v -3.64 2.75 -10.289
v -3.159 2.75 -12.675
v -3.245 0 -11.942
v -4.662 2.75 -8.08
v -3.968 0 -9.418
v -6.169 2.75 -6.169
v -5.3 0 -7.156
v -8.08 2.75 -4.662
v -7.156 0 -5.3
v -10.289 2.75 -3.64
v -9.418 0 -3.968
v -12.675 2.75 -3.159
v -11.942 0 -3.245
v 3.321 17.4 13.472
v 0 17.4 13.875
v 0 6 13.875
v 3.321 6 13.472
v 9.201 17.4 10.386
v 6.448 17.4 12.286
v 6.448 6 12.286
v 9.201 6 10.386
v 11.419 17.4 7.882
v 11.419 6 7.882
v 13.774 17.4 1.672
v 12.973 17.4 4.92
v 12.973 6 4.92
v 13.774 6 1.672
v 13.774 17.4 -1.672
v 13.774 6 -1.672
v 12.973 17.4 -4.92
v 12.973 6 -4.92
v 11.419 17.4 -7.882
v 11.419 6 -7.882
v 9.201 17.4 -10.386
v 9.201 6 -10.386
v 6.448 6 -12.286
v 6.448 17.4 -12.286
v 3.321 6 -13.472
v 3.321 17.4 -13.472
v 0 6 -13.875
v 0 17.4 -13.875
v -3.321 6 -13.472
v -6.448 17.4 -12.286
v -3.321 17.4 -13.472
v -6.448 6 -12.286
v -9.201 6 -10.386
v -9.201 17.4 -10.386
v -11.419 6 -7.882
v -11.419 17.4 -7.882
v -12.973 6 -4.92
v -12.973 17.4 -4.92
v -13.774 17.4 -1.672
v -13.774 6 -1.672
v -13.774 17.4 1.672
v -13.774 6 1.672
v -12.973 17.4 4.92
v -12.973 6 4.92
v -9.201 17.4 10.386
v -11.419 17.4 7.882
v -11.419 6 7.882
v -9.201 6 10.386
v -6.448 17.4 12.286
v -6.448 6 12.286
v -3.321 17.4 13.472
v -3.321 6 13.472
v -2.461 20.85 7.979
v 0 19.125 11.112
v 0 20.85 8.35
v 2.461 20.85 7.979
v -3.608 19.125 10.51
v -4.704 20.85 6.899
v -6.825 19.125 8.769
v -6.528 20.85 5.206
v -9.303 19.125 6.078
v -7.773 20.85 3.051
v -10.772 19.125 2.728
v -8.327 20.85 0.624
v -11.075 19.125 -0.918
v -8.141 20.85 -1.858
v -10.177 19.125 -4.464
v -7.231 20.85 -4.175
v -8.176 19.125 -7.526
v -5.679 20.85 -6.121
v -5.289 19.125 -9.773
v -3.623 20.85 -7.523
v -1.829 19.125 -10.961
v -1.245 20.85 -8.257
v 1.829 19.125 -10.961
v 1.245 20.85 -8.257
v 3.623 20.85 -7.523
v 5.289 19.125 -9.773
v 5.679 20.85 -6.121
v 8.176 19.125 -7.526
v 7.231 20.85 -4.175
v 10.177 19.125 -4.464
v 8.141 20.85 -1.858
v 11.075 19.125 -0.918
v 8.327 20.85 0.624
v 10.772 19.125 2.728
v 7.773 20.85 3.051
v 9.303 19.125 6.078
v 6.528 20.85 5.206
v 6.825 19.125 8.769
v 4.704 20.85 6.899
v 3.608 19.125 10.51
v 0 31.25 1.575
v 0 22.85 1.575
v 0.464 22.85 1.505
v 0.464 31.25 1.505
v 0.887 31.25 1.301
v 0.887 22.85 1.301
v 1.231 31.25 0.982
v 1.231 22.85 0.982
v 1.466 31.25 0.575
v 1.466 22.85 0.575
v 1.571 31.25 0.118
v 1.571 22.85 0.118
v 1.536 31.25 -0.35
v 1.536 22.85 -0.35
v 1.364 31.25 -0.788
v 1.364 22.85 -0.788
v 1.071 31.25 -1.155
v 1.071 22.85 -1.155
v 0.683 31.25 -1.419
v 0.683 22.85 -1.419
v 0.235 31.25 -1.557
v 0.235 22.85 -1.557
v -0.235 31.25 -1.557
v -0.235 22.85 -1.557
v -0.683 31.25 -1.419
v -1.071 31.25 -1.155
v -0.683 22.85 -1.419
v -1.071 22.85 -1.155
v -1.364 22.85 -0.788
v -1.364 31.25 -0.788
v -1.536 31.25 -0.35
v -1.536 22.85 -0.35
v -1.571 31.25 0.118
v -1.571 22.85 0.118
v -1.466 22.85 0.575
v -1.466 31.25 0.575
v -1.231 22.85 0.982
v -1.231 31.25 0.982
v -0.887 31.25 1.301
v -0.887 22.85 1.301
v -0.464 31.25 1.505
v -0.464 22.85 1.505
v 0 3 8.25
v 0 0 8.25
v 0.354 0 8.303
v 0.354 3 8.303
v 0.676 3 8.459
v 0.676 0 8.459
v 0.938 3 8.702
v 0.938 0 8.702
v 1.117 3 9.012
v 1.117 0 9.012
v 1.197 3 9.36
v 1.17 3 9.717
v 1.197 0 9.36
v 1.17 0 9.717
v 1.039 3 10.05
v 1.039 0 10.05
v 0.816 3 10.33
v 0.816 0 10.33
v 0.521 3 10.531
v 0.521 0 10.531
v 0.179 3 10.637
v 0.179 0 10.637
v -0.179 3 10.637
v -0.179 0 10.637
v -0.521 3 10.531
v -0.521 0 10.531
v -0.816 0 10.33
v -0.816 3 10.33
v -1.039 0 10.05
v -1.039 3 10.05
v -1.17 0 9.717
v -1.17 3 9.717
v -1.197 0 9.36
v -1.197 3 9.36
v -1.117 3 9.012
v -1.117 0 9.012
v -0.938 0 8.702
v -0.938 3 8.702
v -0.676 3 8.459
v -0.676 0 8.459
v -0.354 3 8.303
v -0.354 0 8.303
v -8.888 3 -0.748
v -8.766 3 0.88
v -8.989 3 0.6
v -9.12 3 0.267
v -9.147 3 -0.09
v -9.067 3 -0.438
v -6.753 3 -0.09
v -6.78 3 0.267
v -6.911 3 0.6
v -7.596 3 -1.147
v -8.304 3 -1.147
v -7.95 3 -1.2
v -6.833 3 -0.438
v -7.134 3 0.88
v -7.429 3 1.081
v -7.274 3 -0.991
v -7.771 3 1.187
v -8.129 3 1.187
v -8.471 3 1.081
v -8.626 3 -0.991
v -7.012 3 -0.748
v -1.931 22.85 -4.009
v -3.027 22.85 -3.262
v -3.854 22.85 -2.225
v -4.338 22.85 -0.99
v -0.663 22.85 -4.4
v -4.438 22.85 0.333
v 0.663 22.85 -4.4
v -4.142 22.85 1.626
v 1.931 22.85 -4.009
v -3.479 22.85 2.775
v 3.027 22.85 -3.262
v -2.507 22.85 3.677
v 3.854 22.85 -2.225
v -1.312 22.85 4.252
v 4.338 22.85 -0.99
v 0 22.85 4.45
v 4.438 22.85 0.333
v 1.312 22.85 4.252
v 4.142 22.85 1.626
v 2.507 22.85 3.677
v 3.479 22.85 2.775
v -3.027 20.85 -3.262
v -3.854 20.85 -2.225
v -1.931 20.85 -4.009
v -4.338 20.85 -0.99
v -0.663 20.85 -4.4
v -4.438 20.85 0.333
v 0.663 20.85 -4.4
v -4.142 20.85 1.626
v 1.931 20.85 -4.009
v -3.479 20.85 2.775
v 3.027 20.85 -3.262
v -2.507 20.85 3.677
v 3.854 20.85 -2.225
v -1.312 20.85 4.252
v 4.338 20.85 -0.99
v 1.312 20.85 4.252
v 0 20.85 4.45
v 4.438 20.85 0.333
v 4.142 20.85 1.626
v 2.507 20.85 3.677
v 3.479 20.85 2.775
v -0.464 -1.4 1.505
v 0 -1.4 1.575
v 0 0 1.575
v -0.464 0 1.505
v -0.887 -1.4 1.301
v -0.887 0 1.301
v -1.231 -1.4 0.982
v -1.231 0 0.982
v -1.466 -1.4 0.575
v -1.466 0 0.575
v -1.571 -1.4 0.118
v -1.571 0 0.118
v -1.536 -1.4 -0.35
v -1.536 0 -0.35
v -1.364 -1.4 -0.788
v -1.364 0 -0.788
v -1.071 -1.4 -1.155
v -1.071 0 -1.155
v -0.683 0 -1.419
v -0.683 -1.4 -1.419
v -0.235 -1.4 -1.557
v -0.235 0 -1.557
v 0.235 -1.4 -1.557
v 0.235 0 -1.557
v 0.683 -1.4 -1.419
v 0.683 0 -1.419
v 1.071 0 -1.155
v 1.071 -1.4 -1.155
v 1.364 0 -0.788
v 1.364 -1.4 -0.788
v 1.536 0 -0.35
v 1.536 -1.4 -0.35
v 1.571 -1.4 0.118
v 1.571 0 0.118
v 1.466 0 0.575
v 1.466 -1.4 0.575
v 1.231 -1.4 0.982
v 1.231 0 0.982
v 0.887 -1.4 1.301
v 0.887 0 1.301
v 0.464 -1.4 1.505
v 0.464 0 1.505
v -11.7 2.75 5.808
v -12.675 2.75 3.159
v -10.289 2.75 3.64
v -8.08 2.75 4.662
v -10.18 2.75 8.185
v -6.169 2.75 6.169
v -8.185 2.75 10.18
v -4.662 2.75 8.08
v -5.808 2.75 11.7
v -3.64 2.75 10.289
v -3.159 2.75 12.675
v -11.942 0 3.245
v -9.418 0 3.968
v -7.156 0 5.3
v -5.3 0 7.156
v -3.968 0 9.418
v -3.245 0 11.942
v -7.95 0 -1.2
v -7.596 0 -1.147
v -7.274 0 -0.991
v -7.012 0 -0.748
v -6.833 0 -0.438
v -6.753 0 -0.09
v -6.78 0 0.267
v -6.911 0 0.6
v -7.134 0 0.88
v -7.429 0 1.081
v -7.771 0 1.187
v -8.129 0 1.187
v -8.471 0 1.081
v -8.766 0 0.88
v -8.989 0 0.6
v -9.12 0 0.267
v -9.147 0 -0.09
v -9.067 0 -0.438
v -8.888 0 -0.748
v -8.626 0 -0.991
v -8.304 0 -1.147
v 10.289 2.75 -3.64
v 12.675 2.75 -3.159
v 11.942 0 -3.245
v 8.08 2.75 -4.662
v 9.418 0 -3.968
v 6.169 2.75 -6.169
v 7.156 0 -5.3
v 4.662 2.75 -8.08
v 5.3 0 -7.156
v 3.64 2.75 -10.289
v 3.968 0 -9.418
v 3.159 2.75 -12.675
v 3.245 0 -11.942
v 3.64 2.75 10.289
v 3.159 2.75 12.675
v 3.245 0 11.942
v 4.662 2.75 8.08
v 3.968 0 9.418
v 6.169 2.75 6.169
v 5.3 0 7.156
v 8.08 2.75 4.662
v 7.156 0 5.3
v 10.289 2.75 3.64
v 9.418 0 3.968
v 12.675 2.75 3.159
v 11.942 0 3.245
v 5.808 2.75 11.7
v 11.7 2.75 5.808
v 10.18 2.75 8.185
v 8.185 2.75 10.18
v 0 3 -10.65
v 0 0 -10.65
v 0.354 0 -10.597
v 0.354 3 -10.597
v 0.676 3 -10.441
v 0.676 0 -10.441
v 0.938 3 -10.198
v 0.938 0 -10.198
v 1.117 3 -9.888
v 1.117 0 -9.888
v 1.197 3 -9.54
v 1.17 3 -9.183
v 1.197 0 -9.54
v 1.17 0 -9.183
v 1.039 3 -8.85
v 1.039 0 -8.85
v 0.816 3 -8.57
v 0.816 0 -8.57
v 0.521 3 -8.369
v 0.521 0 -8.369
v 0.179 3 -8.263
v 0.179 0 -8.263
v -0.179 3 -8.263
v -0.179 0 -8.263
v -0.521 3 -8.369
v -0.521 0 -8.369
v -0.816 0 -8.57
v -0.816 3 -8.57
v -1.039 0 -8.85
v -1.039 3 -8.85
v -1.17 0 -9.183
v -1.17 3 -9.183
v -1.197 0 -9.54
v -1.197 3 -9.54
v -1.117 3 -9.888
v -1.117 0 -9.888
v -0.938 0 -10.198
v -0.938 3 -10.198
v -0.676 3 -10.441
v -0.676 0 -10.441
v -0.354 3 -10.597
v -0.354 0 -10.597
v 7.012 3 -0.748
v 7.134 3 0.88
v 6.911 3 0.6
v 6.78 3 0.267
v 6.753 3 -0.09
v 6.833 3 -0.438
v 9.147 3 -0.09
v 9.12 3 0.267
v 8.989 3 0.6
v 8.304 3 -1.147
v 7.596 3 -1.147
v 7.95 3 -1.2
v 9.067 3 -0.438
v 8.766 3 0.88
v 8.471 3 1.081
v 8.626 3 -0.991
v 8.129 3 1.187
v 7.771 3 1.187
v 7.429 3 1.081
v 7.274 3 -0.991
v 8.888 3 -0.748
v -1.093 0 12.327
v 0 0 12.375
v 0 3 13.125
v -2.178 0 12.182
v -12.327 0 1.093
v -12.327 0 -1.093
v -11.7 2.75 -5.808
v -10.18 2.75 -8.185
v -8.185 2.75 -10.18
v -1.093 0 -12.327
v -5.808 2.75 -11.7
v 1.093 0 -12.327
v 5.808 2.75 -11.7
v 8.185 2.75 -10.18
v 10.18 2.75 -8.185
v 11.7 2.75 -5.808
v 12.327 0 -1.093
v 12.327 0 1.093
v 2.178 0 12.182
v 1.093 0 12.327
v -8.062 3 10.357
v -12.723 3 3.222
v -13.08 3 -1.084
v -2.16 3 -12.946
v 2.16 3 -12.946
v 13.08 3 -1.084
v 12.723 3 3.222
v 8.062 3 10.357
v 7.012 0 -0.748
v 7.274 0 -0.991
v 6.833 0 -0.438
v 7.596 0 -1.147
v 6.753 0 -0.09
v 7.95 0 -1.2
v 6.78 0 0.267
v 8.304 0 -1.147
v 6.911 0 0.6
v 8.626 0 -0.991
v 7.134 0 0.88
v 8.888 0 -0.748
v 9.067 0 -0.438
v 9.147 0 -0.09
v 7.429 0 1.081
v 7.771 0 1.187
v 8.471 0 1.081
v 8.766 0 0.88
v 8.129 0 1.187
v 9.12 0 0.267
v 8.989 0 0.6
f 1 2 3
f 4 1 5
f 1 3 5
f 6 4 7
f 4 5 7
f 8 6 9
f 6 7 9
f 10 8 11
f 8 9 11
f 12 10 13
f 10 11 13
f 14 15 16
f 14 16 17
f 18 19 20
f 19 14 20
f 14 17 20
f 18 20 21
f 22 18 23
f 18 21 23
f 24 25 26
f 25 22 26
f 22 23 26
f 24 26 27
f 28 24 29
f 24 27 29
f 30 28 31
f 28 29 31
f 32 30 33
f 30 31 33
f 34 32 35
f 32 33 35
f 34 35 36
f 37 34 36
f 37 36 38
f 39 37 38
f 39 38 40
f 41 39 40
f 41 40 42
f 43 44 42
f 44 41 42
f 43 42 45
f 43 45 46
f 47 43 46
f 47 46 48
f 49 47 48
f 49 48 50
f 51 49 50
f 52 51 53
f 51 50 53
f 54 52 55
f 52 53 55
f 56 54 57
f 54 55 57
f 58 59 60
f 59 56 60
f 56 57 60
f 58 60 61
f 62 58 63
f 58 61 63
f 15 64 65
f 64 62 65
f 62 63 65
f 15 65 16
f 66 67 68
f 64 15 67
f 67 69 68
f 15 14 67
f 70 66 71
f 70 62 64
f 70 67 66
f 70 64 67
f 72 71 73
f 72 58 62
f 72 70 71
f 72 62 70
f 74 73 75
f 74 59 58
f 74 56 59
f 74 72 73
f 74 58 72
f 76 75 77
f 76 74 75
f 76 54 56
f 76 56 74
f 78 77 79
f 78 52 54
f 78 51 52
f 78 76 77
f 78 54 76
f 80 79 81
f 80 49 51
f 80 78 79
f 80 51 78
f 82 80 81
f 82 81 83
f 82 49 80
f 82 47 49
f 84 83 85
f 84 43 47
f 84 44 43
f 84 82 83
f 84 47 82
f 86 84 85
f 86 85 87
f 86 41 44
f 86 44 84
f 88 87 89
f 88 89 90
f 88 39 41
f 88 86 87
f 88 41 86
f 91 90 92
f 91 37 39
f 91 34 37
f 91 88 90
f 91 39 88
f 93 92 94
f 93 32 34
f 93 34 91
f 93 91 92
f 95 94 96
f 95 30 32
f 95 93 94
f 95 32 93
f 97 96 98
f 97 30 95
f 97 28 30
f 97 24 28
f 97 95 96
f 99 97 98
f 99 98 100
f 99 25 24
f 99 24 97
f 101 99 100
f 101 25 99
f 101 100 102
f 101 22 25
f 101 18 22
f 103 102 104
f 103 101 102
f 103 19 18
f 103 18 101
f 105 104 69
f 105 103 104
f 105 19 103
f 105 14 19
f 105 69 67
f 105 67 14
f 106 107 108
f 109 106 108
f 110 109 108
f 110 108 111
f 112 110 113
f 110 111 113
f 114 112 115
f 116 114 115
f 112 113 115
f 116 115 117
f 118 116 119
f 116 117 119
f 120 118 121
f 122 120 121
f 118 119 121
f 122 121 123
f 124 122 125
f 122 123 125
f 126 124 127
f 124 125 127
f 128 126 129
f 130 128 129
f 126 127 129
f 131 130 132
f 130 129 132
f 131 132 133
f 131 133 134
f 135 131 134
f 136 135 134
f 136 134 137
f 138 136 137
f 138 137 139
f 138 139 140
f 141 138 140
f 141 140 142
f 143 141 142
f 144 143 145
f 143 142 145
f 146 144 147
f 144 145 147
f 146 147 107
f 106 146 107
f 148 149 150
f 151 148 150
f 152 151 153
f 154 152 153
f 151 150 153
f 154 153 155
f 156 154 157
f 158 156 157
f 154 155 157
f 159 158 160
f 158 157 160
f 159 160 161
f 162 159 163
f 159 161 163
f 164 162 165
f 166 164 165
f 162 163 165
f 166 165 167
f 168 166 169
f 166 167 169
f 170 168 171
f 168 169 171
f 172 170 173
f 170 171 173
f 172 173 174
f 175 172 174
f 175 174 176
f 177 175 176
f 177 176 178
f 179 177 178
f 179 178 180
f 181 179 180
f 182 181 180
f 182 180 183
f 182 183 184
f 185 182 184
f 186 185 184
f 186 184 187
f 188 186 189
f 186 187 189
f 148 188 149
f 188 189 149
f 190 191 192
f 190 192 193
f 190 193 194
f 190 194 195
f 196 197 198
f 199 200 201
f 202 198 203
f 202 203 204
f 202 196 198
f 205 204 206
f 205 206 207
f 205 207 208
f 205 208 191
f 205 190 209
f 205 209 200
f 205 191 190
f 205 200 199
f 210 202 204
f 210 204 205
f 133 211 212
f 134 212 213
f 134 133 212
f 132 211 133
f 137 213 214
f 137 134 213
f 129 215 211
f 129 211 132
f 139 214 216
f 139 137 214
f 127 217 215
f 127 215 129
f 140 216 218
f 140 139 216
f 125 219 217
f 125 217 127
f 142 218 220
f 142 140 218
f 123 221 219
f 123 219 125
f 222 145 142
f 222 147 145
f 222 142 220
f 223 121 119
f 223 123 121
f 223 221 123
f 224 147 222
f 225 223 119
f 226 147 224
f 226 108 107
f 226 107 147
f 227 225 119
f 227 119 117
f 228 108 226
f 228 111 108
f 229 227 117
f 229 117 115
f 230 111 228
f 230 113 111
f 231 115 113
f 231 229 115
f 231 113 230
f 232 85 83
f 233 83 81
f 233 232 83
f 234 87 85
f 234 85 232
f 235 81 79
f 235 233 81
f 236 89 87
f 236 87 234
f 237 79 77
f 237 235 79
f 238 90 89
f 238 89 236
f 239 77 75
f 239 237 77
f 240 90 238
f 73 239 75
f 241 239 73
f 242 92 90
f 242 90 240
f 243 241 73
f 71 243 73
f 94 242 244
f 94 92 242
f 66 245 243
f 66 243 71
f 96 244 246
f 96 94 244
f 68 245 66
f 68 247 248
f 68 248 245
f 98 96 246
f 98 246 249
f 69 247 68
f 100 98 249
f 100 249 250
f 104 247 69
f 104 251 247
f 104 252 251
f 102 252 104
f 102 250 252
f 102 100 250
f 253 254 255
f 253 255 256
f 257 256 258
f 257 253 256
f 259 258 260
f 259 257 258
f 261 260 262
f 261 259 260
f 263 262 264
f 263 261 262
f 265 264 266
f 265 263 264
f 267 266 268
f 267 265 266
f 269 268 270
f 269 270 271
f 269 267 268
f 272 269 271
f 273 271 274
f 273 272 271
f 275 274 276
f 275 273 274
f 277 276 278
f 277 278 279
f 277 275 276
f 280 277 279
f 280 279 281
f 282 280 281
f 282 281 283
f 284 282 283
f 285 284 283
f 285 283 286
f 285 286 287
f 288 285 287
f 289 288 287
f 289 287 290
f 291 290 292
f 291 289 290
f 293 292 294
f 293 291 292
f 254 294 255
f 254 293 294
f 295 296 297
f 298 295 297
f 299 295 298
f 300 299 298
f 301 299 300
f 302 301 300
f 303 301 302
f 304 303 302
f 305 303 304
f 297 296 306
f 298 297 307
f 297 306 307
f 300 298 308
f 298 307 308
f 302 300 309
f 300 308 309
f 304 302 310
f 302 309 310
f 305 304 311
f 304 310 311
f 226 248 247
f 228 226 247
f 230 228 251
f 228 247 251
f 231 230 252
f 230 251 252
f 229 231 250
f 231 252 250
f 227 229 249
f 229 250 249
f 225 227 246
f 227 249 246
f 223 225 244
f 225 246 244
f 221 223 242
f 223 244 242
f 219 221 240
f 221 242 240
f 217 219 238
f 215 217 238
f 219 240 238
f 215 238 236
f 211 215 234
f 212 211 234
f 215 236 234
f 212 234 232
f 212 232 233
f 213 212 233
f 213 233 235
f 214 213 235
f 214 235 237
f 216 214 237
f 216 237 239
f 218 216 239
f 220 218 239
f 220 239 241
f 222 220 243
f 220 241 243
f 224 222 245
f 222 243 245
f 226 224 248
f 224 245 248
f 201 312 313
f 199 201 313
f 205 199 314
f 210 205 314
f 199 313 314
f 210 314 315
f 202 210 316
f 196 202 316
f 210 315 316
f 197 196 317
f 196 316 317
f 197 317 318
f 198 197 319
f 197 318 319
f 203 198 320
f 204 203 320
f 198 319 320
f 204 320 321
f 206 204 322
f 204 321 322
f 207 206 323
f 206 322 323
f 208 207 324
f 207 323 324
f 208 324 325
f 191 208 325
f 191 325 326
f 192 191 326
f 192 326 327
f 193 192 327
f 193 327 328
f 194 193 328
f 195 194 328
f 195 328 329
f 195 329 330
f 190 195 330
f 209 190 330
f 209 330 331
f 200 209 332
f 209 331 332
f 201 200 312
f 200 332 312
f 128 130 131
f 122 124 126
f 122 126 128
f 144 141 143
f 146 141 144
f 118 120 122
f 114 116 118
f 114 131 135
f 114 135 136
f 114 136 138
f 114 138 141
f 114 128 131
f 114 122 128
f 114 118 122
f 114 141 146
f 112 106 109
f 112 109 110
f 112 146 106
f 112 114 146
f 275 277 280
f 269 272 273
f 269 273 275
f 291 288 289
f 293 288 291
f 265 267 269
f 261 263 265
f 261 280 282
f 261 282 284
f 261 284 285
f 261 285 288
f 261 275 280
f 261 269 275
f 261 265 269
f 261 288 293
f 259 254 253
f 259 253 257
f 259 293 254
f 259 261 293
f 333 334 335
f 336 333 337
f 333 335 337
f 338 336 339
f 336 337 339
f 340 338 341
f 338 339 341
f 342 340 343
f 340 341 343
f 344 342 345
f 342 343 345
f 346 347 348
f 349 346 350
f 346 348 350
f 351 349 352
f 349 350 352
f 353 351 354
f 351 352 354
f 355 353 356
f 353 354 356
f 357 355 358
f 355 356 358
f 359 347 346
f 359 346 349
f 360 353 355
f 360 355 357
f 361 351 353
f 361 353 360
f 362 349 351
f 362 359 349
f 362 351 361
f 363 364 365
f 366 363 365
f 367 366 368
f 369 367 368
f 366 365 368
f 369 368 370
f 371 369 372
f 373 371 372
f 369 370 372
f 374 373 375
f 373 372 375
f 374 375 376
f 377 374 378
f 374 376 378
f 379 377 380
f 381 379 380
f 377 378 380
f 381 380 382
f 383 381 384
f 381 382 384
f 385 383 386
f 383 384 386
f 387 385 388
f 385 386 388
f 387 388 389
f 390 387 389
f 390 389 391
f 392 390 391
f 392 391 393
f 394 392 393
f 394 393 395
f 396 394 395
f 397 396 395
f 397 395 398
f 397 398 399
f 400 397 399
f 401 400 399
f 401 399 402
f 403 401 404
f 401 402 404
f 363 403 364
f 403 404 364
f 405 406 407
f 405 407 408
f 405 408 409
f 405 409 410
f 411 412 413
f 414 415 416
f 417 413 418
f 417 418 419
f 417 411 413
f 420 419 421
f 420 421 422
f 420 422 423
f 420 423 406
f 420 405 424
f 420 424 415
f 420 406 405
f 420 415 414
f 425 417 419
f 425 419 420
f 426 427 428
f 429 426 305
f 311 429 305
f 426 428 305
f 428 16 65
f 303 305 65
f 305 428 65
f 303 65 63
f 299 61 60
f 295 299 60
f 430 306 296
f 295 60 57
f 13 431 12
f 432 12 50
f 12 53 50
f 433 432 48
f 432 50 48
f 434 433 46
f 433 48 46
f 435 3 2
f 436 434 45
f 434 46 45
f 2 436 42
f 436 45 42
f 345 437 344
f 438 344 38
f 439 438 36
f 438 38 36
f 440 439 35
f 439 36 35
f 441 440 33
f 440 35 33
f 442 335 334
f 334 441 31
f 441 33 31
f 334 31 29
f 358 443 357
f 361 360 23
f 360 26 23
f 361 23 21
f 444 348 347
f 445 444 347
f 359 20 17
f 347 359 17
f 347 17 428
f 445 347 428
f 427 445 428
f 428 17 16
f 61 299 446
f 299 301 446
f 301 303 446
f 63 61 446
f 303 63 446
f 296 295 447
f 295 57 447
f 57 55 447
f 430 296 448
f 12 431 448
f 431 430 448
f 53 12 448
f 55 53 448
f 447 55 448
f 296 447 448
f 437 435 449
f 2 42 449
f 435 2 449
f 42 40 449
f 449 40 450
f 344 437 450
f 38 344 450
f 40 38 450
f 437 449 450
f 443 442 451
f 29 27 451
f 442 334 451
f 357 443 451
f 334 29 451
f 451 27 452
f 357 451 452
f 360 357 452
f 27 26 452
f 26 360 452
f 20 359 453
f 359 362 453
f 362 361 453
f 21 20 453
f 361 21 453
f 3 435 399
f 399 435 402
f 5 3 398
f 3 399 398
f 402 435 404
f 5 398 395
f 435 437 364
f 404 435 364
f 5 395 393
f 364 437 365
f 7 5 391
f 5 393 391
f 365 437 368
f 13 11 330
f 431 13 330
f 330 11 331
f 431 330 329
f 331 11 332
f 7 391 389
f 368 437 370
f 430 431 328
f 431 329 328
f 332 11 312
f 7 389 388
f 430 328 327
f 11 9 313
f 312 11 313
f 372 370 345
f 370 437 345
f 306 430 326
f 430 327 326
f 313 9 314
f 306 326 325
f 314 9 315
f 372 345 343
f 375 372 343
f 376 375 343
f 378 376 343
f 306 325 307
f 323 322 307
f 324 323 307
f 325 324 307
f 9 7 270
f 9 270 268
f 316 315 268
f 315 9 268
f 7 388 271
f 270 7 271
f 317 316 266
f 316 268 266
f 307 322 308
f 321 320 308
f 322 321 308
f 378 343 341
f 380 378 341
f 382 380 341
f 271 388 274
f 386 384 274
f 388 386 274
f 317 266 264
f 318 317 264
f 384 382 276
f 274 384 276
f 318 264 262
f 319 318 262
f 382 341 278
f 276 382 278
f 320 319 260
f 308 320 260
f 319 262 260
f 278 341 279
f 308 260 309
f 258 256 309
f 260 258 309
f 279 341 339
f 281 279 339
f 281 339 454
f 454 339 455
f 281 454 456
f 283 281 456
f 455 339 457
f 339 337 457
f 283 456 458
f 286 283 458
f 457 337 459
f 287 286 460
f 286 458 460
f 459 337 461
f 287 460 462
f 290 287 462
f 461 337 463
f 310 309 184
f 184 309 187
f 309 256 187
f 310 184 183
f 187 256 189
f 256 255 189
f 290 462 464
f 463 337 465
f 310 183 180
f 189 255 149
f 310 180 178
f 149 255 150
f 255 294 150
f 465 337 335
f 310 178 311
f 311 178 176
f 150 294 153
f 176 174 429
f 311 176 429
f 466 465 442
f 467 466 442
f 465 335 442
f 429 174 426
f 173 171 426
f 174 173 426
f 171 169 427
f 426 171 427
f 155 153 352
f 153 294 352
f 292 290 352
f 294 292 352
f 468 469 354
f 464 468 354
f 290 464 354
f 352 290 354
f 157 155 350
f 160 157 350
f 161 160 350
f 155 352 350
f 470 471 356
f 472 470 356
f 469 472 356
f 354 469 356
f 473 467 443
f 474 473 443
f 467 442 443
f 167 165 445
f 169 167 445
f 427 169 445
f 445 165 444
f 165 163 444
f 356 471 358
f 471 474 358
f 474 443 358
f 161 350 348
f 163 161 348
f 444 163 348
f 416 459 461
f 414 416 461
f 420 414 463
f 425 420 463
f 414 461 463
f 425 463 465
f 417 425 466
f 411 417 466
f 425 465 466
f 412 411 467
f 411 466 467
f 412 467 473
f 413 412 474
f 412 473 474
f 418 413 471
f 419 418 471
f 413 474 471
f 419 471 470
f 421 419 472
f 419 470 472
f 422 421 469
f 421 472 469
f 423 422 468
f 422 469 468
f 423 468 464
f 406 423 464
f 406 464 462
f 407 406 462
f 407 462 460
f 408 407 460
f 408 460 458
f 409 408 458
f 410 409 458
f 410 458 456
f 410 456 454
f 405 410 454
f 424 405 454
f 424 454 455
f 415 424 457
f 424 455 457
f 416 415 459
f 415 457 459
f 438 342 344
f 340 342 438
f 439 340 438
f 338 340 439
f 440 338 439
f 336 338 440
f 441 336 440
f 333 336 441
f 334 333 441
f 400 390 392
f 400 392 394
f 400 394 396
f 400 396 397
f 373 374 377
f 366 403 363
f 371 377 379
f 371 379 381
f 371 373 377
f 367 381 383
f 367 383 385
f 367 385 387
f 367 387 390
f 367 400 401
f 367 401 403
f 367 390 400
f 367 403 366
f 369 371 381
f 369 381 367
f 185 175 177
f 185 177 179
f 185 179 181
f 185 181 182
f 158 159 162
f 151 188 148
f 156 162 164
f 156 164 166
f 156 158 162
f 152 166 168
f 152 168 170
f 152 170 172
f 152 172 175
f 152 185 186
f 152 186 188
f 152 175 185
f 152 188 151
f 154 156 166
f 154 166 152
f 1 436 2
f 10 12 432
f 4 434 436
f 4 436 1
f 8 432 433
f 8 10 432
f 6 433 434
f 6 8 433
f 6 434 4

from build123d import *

# Parameters (mm, degrees)
SKETCH1_R      = 13.875
EXTRUDE1_DEPTH = 20.85
SKETCH3_R      = 4.45
EXTRUDE2_DEPTH = 2
EXTRUDE3_DEPTH = 2.75
SKETCH6_R      = 1.575
EXTRUDE4_DEPTH = 8.4
EXTRUDE5_START = 1.4
SKETCH7_R      = 1.575
EXTRUDE5_DEPTH = 1.4
SKETCH8_R      = 1.2
EXTRUDE7_DEPTH = 3


with BuildPart() as part:
    # Sketch1 → Extrude1 (new body)
    with BuildSketch(Plane(origin=(0, 0, 0), x_dir=(1, 0, 0), z_dir=(0, 1, 0))):
        with Locations(Location((0, 0, 0), (0, 0, 270))):
            Circle(SKETCH1_R)
    extrude(amount=EXTRUDE1_DEPTH)

    # Sketch2 → Cut-Revolve1 (revolve, cut)
    with BuildSketch(Plane.XY, mode=Mode.PRIVATE) as cut_revolve1_sk:
        Polygon((8.35, 20.85), (13.875, 17.4), (13.875, 20.85), align=None)
    revolve(cut_revolve1_sk.sketch.rotate(Axis((0, 20.85, 0), (0, -1, 0)), 90), axis=Axis((0, 20.85, 0), (0, -1, 0)), mode=Mode.SUBTRACT)

    # Sketch3 → Extrude2 (add)
    with BuildSketch(Plane(origin=(0, 20.85, 0), x_dir=(1, 0, 0), z_dir=(0, 1, 0))):
        with Locations(Location((0, 0, 0), (0, 0, 270))):
            Circle(SKETCH3_R)
    extrude(amount=EXTRUDE2_DEPTH)

    # Sketch4 → Extrude3 (cut)
    with BuildSketch(Plane.XZ):
        with BuildLine():
            ThreePointArc((-13.518505835, 3.125), (-6.169187379, 6.169187379), (-3.125, 13.518505835))
            ThreePointArc((-3.125, 13.518505835), (-9.811106589, 9.811106589), (-13.518505835, 3.125))
        make_face()
        with BuildLine():
            ThreePointArc((3.125, 13.518505835), (6.169187379, 6.169187379), (13.518505835, 3.125))
            ThreePointArc((13.518505835, 3.125), (9.811106589, 9.811106589), (3.125, 13.518505835))
        make_face()
        with BuildLine():
            ThreePointArc((13.518505835, -3.125), (6.169187379, -6.169187379), (3.125, -13.518505835))
            ThreePointArc((3.125, -13.518505835), (9.811106589, -9.811106589), (13.518505835, -3.125))
        make_face()
        with BuildLine():
            ThreePointArc((-3.125, -13.518505835), (-6.169187379, -6.169187379), (-13.518505835, -3.125))
            ThreePointArc((-13.518505835, -3.125), (-9.811106589, -9.811106589), (-3.125, -13.518505835))
        make_face()
    extrude(amount=-EXTRUDE3_DEPTH, mode=Mode.SUBTRACT)

    # Sketch5 → Cut-Revolve2 (revolve, cut)
    with BuildSketch(Plane(origin=(0, 0, 0), x_dir=(0, 0, -1), z_dir=(1, 0, 0))):
        Polygon((-13.875, 0), (-12.375, 0), (-13.875, 6), align=None)
    revolve(axis=Axis((0, 20.85, 0), (0, -1, 0)), mode=Mode.SUBTRACT)

    # Sketch6 → Extrude4 (add)
    with BuildSketch(Plane(origin=(0, 22.85, 0), x_dir=(-1, 0, 0), z_dir=(0, 1, 0))):
        with Locations(Location((0, 0, 0), (0, 0, 90))):
            Circle(SKETCH6_R)
    extrude(amount=EXTRUDE4_DEPTH)

    # Sketch7 → Extrude5 (add)
    with BuildSketch(Plane.XZ.offset(EXTRUDE5_START)):
        with Locations(Location((0, 0, 0), (0, 0, 90))):
            Circle(SKETCH7_R)
    extrude(amount=-EXTRUDE5_DEPTH)

    # Sketch8 → Extrude7 (cut)
    with BuildSketch(Plane.XZ):
        with Locations(Location((-7.95, 0, 0), (0, 0, 270))):
            Circle(SKETCH8_R)
        with Locations(Location((7.95, 0, 0), (0, 0, 270))):
            Circle(SKETCH8_R)
        with Locations(Location((0, 9.45, 0), (0, 0, 270))):
            Circle(SKETCH8_R)
        with Locations(Location((0, -9.45, 0), (0, 0, 270))):
            Circle(SKETCH8_R)
    extrude(amount=-EXTRUDE7_DEPTH, mode=Mode.SUBTRACT)


solid = part.part
